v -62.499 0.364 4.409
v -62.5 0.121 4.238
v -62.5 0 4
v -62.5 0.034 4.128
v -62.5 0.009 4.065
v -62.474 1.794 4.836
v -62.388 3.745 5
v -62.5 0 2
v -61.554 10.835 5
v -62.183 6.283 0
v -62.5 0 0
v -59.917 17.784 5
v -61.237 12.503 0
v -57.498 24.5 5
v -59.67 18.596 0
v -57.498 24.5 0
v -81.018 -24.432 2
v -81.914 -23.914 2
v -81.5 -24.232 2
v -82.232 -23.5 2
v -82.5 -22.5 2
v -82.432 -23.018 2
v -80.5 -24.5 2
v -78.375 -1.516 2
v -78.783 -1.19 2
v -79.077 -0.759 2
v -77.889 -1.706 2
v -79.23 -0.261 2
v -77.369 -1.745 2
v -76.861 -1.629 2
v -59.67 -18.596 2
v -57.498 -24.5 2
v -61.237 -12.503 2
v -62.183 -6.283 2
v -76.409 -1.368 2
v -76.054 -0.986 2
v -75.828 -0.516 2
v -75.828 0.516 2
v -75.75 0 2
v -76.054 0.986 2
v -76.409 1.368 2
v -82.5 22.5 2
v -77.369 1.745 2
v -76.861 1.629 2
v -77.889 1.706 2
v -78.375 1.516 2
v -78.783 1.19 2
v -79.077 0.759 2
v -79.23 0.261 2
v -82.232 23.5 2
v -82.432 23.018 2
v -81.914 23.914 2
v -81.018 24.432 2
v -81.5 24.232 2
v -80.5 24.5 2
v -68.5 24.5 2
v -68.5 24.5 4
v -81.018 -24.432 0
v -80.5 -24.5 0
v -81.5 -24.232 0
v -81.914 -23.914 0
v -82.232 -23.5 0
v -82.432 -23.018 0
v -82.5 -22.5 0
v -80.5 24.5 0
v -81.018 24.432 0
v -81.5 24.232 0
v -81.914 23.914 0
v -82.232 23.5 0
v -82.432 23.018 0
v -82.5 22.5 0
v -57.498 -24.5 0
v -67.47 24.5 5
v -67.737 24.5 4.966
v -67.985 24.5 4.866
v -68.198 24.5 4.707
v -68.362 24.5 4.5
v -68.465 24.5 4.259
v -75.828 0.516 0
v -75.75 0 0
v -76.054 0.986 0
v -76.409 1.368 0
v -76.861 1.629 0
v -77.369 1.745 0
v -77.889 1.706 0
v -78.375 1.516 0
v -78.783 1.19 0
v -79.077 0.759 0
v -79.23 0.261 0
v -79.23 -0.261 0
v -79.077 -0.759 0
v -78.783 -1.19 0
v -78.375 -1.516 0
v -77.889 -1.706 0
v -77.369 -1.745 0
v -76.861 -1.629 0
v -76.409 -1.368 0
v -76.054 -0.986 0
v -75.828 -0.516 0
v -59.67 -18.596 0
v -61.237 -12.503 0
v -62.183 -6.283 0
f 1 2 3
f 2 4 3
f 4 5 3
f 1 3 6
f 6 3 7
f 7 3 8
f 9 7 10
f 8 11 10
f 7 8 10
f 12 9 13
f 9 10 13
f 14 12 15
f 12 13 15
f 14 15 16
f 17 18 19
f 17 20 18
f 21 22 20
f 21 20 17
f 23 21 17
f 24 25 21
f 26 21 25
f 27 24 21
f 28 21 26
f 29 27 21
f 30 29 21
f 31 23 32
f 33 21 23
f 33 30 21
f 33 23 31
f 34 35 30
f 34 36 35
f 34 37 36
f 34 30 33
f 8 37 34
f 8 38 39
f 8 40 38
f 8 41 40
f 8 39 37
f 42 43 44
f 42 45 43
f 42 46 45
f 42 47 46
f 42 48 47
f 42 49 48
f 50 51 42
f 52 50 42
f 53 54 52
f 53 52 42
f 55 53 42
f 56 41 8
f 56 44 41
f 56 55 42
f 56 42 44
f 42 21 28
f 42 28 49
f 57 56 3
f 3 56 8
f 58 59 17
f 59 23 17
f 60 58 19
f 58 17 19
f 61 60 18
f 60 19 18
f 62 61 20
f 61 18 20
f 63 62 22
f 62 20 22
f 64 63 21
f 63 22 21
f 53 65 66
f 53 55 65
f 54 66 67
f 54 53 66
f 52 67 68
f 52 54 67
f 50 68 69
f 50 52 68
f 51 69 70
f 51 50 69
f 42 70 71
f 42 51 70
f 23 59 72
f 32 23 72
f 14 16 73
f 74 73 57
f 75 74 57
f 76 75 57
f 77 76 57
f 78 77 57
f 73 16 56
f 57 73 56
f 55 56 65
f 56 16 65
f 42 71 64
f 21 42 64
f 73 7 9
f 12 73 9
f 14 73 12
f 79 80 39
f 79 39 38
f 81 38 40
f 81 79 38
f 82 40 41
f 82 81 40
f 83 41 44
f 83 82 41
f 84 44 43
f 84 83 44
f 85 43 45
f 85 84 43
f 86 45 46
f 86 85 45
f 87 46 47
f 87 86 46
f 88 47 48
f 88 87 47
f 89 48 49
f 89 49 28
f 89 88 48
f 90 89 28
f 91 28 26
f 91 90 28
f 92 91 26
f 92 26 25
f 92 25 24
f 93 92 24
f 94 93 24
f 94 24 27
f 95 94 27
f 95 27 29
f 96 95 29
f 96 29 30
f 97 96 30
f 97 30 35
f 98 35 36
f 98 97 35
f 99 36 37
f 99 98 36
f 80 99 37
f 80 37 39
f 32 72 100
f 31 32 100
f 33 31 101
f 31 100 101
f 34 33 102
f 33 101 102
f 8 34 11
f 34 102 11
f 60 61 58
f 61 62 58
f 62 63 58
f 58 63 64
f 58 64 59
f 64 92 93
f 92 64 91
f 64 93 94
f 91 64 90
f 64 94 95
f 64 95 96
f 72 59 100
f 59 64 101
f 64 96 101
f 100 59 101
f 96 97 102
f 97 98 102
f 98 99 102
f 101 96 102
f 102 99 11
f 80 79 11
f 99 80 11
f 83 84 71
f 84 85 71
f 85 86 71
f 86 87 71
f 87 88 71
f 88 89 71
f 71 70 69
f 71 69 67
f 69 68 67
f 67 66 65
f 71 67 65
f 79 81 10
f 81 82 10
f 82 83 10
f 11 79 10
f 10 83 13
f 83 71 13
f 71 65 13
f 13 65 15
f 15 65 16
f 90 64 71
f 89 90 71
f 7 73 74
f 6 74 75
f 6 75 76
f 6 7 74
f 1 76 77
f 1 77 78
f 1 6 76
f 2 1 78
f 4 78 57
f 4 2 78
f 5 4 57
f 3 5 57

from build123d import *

# Parameters (mm, degrees)
F1_DEPTH = 5
F0_R     = 1.75
F2_DEPTH = 2
F3_R     = 2
F4_R     = 1


with BuildPart() as f1:
    # F0 (on Top) → F1 (new body)
    with BuildSketch(Plane.XY):
        with BuildLine():
            Line((-57.497826, 24.5), (-68.5, 24.5))
            Line((-68.5, 24.5), (-62.5, 0))
            ThreePointArc((-62.5, 0), (-61.236689, 12.502717), (-57.497826, 24.5))
        make_face()
    extrude(amount=F1_DEPTH)

    # F0 (on Top) → F2 (join)
    with BuildSketch(Plane.XY):
        with BuildLine():
            Line((-68.5, 24.5), (-82.5, 24.5))
            Line((-82.5, 24.5), (-82.5, -24.5))
            Line((-82.5, -24.5), (-57.497826, -24.5))
            ThreePointArc((-57.497826, -24.5), (-61.236689, -12.502717), (-62.5, 0))
            Line((-62.5, 0), (-68.5, 24.5))
        make_face()
        with Locations((-77.5, 0)):
            Circle(F0_R, mode=Mode.SUBTRACT)
    extrude(amount=F2_DEPTH)

    # F3
    f3_edges = [f1.edges().sort_by_distance(p)[0] for p in [
        (-82.5, -24.5, 1),
        (-82.5, 24.5, 1),
    ]]
    fillet(f3_edges, radius=F3_R)

    # F4
    f4_edges = [f1.edges().sort_by_distance(p)[0] for p in [
        (-65.5, 12.25, 5),
    ]]
    fillet(f4_edges, radius=F4_R)


solid = f1.part
